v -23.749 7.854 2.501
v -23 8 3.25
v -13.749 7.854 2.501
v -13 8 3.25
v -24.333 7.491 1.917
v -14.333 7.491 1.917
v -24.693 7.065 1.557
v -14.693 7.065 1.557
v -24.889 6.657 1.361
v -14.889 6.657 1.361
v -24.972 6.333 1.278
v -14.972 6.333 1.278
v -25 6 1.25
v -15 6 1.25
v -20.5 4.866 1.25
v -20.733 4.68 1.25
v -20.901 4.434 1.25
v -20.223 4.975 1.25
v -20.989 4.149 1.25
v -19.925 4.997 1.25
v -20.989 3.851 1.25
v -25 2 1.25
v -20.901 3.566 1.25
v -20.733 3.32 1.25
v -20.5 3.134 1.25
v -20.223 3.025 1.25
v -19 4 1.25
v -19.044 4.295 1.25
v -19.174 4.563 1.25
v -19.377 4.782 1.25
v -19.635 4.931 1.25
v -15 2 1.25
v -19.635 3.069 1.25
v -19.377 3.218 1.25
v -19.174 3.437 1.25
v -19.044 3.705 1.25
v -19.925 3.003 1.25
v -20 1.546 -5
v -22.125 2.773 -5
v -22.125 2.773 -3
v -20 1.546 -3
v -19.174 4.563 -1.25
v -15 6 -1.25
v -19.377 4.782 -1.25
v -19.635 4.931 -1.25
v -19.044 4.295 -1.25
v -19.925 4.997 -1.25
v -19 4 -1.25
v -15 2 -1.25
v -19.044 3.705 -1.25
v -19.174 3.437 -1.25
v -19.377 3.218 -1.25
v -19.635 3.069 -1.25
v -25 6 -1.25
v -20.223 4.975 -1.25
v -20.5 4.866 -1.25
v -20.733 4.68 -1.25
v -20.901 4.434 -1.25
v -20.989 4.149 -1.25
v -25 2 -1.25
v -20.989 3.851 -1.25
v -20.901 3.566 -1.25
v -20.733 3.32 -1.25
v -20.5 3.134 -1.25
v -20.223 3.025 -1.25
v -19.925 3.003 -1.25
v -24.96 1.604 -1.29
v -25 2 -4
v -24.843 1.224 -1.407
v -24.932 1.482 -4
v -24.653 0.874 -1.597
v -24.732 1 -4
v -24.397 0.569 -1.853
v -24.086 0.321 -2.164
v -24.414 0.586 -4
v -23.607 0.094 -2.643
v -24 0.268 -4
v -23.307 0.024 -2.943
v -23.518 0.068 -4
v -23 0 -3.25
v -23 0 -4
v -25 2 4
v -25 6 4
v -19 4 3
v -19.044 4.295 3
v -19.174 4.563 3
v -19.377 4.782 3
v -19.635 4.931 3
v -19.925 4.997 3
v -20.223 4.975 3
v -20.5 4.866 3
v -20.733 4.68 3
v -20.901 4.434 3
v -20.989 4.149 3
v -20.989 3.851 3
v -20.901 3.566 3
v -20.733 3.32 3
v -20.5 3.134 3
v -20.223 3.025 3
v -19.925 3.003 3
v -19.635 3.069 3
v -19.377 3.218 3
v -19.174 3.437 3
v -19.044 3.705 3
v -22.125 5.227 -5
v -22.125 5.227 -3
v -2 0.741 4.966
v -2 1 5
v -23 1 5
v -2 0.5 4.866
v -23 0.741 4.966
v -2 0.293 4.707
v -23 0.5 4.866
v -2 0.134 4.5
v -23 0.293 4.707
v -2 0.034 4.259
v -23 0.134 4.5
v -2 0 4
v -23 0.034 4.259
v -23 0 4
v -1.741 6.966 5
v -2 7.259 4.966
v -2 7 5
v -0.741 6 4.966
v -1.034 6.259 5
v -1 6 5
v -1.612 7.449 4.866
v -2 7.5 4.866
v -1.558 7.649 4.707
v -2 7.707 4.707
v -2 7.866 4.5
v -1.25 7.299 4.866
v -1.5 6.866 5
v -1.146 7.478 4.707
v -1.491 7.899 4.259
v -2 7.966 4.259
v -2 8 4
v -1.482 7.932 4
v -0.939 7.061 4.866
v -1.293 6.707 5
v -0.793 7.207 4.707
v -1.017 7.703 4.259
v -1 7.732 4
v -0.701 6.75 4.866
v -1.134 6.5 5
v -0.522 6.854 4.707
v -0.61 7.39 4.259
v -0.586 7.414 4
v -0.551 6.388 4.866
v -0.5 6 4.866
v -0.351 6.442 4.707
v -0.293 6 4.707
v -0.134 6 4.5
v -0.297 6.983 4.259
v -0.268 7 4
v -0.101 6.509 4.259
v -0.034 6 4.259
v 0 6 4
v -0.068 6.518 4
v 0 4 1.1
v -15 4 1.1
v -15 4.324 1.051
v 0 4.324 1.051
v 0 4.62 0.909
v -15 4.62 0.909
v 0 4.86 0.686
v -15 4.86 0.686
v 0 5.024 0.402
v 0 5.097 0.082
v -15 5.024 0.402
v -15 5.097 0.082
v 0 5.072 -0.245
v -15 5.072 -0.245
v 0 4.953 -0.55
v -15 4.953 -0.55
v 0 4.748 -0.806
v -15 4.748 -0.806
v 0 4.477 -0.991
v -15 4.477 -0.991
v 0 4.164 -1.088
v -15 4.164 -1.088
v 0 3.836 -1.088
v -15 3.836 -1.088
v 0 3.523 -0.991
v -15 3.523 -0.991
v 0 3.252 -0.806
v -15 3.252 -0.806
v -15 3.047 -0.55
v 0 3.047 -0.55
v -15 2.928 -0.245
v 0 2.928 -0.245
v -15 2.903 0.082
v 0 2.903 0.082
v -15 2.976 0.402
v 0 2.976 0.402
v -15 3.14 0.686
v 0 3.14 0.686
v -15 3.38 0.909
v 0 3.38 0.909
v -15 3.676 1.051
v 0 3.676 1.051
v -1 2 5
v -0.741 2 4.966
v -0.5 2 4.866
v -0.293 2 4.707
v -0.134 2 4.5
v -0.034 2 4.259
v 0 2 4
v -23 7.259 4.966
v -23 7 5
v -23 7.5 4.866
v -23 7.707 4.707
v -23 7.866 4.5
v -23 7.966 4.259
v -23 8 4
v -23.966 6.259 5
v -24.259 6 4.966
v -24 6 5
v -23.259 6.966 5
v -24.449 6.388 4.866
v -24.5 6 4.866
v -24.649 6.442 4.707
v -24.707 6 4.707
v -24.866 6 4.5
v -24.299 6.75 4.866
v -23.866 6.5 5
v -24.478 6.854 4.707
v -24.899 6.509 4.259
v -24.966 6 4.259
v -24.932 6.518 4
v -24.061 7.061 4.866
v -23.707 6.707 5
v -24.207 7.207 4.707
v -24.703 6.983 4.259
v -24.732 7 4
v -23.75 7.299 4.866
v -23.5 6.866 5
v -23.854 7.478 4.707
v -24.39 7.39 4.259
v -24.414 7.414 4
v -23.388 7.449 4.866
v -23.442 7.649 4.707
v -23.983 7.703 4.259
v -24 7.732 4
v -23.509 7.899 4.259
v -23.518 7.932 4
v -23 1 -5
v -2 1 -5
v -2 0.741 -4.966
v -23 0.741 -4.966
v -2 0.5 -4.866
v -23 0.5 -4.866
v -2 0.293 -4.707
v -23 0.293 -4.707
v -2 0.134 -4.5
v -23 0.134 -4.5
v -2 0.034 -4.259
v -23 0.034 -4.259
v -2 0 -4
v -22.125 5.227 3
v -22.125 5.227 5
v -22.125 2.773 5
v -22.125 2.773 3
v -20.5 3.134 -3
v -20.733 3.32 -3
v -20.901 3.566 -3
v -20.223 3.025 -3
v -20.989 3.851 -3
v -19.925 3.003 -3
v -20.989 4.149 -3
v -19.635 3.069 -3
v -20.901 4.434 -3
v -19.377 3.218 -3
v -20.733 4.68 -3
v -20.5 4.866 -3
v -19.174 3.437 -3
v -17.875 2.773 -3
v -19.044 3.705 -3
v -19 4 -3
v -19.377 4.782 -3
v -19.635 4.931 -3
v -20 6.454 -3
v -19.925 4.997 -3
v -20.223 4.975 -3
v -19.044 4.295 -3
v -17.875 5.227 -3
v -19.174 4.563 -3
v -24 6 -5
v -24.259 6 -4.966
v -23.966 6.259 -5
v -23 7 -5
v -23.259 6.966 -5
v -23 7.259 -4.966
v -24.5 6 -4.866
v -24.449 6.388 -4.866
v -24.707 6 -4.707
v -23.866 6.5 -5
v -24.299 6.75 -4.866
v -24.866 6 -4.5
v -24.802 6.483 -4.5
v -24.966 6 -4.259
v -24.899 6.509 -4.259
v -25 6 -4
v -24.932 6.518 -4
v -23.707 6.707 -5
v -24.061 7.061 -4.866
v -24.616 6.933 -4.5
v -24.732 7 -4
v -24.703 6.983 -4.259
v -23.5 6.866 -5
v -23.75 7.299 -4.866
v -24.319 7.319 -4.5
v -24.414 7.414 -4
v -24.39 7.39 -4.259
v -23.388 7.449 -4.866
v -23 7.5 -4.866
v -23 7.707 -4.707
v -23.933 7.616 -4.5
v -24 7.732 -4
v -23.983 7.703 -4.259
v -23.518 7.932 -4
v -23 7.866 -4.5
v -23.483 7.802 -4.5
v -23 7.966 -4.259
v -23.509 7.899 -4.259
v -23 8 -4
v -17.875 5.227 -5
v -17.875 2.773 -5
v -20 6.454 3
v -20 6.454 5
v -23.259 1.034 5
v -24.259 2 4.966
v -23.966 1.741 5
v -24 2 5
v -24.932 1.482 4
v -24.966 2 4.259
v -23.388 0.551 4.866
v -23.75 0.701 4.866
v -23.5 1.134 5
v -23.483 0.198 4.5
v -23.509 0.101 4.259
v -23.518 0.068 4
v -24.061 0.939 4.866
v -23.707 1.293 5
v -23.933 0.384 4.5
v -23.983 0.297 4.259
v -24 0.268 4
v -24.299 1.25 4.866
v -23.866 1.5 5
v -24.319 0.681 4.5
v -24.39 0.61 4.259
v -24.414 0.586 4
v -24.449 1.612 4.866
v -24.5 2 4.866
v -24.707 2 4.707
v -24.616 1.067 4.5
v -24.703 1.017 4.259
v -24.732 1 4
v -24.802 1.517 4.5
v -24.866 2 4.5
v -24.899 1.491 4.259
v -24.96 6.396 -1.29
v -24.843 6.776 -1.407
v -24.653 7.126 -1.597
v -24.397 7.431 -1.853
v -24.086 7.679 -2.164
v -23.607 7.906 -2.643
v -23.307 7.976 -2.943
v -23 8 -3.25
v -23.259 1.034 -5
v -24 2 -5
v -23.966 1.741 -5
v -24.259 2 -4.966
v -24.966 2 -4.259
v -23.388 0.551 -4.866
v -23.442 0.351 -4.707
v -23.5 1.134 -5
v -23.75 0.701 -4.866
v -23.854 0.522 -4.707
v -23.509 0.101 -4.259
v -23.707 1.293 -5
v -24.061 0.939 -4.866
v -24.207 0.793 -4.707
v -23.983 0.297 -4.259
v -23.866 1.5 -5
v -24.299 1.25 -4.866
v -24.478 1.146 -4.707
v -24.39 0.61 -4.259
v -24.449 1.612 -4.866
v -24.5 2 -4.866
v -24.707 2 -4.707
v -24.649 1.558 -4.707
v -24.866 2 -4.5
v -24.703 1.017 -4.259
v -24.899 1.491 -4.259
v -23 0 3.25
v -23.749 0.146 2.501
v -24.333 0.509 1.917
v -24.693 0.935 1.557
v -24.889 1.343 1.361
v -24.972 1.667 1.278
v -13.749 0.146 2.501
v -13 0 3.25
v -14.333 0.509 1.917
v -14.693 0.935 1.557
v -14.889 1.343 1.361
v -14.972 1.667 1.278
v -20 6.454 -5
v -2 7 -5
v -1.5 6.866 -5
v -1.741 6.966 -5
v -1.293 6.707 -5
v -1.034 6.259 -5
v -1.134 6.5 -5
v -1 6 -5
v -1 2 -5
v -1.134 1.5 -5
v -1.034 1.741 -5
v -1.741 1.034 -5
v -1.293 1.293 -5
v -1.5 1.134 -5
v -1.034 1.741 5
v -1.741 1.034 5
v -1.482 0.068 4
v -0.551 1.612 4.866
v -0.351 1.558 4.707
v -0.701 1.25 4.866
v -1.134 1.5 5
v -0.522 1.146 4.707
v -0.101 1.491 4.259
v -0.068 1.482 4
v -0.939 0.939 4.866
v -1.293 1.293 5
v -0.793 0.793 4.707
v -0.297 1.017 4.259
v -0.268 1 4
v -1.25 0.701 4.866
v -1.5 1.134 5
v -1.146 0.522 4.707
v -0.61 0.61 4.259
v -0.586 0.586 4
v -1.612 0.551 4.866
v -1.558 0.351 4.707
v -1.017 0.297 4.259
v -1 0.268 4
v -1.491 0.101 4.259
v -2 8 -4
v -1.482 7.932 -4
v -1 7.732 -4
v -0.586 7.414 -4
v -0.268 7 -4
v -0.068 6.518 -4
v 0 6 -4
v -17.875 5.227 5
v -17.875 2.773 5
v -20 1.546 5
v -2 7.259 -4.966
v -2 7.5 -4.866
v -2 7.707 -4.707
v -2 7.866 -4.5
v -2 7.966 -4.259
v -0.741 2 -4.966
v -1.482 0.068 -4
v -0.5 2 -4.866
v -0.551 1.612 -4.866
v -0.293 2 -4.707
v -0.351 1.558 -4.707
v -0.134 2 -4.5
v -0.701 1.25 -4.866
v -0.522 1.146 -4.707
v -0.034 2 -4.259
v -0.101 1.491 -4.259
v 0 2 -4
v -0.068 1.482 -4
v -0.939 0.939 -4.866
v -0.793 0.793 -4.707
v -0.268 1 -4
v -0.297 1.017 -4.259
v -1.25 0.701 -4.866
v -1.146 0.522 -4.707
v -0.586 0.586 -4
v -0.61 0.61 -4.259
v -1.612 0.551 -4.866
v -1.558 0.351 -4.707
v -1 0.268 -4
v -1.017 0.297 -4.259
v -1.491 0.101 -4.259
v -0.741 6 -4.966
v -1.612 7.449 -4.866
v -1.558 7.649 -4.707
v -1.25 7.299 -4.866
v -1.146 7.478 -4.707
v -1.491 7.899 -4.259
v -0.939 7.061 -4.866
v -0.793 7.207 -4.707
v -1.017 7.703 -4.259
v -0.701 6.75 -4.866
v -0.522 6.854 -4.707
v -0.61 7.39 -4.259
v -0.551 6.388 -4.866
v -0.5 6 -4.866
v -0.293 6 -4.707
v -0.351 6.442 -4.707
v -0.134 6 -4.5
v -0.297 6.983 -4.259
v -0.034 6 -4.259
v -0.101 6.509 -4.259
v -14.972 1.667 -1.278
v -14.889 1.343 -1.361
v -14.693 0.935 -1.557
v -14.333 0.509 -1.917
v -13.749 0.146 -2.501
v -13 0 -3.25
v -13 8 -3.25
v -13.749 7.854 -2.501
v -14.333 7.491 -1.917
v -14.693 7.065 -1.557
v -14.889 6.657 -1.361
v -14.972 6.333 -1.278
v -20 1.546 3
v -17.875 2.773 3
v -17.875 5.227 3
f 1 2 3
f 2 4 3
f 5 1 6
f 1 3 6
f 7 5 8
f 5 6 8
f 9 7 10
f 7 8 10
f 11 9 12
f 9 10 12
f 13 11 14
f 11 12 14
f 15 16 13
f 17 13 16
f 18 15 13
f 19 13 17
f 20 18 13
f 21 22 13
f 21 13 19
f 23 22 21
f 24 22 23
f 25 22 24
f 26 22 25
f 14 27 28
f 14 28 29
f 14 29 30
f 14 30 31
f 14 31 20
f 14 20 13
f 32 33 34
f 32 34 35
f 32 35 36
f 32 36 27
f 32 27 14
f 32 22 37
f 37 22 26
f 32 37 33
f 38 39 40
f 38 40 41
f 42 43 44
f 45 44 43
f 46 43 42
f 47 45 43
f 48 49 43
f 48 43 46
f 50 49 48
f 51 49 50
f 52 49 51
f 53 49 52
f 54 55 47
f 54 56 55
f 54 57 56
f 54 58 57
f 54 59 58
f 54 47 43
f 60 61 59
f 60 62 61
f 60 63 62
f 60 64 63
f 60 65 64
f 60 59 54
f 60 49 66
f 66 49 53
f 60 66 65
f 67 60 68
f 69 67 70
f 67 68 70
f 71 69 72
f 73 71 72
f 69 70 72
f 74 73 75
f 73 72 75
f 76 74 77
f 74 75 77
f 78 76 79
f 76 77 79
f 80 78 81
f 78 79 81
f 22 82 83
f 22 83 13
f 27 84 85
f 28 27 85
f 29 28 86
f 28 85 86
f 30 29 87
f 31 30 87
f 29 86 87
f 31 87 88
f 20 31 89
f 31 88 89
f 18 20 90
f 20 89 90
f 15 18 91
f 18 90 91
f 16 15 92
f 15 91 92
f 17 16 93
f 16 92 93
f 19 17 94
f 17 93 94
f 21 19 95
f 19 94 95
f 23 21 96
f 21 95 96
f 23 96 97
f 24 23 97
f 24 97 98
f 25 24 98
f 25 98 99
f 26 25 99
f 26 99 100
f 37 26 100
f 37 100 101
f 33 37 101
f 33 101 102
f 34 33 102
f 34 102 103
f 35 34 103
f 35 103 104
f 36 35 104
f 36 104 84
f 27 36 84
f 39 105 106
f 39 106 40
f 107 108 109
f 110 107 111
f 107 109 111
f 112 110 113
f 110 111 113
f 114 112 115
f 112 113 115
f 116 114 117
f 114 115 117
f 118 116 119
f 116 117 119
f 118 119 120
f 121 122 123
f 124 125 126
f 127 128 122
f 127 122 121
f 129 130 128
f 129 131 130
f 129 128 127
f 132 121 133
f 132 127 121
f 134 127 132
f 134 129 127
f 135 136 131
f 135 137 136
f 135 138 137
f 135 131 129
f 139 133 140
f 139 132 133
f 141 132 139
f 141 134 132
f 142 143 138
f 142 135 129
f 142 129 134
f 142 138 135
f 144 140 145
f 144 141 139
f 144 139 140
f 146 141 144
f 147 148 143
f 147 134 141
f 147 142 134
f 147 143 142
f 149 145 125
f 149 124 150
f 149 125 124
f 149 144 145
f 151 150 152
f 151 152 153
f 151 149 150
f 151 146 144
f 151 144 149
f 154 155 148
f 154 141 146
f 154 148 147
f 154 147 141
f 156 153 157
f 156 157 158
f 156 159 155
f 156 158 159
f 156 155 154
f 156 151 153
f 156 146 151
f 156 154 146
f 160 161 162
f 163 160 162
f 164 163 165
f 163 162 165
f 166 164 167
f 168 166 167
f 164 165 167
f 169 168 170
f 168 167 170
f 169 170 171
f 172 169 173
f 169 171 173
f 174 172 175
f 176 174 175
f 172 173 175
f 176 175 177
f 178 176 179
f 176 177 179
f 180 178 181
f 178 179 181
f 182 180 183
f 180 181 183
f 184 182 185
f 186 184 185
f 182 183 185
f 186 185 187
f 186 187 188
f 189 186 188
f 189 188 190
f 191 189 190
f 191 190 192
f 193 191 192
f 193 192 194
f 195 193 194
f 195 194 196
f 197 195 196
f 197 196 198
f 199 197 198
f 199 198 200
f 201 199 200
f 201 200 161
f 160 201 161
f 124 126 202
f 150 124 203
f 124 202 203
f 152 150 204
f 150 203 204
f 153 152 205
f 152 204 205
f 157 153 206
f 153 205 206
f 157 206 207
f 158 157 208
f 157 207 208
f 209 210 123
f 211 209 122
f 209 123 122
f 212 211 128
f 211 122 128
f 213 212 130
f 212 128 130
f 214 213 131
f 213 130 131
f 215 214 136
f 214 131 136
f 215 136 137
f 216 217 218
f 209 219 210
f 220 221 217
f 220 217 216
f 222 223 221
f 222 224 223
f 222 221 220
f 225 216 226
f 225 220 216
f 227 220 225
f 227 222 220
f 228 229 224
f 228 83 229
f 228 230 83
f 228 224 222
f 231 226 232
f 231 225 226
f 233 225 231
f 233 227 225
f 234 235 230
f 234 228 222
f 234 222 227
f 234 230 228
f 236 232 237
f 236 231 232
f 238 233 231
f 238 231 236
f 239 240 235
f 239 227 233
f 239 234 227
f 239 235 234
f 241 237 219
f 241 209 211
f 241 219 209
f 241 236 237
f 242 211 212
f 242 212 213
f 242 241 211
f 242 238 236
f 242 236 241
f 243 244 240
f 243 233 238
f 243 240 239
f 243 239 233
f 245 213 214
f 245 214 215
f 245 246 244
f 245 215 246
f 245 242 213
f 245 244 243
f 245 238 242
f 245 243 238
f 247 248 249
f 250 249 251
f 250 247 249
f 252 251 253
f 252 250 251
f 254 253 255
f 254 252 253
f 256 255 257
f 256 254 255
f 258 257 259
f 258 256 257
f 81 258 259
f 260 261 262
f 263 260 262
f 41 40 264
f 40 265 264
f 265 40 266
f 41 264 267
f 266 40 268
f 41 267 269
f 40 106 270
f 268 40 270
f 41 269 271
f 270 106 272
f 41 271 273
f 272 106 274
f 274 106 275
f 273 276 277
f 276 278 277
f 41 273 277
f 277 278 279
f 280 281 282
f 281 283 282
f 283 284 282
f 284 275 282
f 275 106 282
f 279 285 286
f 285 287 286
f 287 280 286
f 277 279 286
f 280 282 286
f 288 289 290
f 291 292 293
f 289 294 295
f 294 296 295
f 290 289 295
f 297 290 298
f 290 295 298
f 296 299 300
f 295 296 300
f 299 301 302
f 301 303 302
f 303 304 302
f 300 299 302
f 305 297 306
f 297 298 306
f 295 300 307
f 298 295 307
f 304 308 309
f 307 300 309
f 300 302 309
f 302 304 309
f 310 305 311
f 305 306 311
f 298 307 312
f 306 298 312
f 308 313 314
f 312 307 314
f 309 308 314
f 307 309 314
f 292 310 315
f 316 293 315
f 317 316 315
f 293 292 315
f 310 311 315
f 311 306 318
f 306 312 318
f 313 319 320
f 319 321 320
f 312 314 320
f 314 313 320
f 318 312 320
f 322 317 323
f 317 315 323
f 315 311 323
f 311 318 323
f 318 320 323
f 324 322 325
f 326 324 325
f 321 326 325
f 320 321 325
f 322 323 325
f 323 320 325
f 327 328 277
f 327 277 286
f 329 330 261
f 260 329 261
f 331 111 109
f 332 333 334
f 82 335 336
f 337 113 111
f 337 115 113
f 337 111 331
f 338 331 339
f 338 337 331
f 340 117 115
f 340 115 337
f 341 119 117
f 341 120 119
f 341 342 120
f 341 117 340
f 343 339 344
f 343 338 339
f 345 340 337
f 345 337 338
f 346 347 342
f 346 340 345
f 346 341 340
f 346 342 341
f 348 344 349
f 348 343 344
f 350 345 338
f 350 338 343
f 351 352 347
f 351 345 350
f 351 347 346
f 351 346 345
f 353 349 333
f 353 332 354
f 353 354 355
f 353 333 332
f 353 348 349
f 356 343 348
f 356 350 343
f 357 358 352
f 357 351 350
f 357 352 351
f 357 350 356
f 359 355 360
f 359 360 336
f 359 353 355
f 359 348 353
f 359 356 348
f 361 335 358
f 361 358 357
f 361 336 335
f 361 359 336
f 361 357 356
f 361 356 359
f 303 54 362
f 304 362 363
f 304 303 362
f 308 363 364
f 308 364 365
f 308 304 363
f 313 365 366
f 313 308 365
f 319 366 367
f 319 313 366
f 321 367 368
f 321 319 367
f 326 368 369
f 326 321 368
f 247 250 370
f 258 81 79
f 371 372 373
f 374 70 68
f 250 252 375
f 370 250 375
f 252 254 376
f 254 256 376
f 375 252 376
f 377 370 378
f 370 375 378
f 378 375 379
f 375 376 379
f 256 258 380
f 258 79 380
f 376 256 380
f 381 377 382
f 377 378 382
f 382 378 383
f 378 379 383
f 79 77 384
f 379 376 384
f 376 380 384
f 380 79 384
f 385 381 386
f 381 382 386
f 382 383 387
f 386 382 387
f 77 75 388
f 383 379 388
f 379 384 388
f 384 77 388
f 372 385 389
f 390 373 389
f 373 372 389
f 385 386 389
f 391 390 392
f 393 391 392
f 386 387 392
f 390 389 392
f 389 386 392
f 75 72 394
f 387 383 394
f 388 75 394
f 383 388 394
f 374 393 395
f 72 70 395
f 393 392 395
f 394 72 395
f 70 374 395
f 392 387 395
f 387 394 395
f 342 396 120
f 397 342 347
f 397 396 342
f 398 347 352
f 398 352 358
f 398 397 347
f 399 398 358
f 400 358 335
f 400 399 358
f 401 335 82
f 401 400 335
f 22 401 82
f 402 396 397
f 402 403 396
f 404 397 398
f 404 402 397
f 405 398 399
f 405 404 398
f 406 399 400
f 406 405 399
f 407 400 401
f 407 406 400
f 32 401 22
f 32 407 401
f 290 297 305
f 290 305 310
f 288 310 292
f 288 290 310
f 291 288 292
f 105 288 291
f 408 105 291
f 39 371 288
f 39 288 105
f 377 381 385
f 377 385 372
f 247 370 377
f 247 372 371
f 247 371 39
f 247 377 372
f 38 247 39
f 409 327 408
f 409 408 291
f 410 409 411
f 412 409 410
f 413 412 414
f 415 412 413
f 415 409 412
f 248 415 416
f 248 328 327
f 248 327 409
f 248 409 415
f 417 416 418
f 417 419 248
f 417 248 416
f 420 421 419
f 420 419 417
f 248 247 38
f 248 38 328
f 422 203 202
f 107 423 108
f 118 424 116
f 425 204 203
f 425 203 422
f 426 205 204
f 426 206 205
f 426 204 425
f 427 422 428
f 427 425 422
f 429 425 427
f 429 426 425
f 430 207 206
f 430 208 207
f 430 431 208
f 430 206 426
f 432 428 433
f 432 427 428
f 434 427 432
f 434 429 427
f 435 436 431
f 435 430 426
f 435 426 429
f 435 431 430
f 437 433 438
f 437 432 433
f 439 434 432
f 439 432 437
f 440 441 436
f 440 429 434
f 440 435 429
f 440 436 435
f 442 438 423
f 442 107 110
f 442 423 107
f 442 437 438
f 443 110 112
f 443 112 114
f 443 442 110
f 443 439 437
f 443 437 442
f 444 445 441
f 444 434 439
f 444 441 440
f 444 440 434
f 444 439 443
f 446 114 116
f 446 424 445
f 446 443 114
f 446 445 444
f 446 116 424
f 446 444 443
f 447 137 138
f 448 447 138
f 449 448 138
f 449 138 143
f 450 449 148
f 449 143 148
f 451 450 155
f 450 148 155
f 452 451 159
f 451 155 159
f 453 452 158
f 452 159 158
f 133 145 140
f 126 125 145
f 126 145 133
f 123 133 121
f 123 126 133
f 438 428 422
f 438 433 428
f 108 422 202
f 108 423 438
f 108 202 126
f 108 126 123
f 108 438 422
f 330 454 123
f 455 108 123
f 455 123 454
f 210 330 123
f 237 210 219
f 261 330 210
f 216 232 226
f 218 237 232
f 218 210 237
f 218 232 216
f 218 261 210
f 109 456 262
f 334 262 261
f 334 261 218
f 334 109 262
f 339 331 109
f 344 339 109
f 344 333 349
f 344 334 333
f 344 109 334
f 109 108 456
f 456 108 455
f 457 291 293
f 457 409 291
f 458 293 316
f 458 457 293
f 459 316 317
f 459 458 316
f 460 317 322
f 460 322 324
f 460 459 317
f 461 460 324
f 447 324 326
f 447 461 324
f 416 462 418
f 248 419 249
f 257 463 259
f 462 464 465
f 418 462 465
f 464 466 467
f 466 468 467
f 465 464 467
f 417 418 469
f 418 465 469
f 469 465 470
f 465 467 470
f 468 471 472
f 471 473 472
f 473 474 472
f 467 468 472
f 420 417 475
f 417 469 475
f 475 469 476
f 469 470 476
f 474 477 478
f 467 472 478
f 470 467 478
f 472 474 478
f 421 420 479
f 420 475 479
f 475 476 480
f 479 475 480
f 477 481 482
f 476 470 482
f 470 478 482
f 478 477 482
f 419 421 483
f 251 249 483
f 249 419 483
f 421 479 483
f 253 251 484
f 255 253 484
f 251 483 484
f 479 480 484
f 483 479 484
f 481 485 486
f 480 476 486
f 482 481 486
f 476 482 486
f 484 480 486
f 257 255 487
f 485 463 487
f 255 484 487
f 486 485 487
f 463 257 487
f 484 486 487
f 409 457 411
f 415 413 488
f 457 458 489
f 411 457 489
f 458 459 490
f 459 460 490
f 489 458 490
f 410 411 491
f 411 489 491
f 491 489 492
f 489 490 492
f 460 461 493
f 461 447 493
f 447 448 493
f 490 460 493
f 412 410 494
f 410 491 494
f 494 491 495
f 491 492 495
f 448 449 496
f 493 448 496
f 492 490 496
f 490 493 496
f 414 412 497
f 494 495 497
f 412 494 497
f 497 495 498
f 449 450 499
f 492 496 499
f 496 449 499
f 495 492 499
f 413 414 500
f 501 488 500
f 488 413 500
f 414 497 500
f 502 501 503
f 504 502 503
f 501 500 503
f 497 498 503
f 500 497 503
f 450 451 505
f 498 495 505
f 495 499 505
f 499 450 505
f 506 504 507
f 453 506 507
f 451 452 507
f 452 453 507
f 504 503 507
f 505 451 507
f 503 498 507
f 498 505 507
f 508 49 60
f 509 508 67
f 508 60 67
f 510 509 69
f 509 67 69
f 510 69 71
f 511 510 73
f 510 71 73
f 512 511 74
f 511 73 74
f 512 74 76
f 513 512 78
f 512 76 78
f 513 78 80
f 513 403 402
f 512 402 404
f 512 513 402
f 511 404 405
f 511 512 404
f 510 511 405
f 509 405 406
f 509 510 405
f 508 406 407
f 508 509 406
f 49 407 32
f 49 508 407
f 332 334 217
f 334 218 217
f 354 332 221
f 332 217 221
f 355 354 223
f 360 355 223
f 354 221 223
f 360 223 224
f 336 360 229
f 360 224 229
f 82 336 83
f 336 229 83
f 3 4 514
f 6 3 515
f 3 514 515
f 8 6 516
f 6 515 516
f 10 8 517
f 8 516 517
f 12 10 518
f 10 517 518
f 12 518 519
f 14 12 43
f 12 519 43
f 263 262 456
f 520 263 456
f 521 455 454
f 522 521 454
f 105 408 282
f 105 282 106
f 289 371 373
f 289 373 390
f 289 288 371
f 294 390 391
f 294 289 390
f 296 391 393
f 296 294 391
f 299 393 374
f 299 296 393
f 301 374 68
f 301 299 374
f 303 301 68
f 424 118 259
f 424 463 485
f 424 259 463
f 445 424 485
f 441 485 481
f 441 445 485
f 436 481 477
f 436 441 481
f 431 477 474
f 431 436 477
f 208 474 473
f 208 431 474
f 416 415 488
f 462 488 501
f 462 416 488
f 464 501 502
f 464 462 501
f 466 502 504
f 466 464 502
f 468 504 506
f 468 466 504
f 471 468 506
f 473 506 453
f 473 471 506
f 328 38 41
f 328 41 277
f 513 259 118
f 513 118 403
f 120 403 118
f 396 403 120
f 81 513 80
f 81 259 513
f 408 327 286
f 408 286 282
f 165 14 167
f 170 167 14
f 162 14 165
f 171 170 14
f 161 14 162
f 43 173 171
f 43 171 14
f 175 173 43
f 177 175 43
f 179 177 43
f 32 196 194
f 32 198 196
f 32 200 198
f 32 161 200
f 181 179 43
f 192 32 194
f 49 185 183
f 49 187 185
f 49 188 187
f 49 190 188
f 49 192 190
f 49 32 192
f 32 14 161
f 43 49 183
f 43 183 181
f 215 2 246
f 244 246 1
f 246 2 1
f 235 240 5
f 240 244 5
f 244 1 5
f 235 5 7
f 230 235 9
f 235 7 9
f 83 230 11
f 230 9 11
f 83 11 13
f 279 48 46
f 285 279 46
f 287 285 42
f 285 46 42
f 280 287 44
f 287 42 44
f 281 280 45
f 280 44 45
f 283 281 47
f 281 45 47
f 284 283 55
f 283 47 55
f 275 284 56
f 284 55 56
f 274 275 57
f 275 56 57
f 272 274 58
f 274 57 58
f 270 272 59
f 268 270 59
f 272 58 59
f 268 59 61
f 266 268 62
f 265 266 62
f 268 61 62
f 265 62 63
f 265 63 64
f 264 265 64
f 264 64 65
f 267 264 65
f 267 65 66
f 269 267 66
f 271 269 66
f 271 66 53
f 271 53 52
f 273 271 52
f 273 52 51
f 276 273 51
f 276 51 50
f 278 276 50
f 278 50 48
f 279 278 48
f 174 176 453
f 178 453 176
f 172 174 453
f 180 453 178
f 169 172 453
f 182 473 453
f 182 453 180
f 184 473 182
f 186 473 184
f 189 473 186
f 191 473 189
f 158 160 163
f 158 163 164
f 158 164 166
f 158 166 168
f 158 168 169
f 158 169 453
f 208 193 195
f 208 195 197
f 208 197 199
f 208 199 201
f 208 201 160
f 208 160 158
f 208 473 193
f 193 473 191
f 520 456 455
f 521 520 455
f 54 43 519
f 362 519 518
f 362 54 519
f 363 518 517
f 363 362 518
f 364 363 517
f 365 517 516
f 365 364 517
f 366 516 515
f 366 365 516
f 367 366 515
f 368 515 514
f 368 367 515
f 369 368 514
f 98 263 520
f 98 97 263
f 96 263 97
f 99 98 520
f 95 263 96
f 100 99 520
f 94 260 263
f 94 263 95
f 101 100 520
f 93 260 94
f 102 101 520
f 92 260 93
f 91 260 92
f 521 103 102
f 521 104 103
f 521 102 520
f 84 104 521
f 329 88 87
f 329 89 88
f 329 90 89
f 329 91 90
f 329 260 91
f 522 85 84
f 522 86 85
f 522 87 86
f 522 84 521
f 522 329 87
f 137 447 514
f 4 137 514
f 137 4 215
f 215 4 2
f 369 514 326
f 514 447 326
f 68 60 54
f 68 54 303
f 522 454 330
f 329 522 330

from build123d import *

# Parameters (mm, degrees)
BOSS_EXTRUDE1_DEPTH = 8
SKETCH2_R           = 1.1
CUT_EXTRUDE1_DEPTH  = 18.720045147
SKETCH3_R           = 1
CUT_EXTRUDE2_DEPTH  = 29.08914381
CUT_EXTRUDE3_DEPTH  = 2
FILLET1_R           = 2
FILLET2_R           = 1


with BuildPart() as part:
    # Sketch1 → Boss-Extrude1 (new body)
    with BuildSketch(Plane(origin=(0, 0, 0), x_dir=(1, 0, 0), z_dir=(0, 1, 0))):
        Polygon((-25, 1.25), (-25, 5), (0, 5), (0, -5), (-25, -5), (-25, -1.25), (-15, -1.25), (-15, 1.25), align=None)
    extrude(amount=BOSS_EXTRUDE1_DEPTH)

    # Sketch2 → Cut-Extrude1 (cut, through all)
    with BuildSketch(Plane.ZY.offset(15)):
        with Locations((0, 4)):
            Circle(SKETCH2_R)
    extrude(amount=-CUT_EXTRUDE1_DEPTH, mode=Mode.SUBTRACT)

    # Sketch3 → Cut-Extrude2 (cut, through all)
    with BuildSketch(Plane.XY.offset(5)):
        with Locations((-20, 4)):
            Circle(SKETCH3_R)
    extrude(amount=-CUT_EXTRUDE2_DEPTH, mode=Mode.SUBTRACT)

    # Sketch4 → Cut-Extrude3 (cut)
    with BuildSketch(Plane.XY.offset(5)):
        Polygon((-20, 1.546261356), (-17.875, 2.773130678), (-17.875, 5.226869322), (-20, 6.453738644), (-22.125, 5.226869322), (-22.125, 2.773130678), align=None)
    cut_extrude3 = extrude(amount=-CUT_EXTRUDE3_DEPTH, mode=Mode.SUBTRACT)

    # Mirror1: Cut-Extrude3 across plane
    add(cut_extrude3.mirror(Plane.XY), mode=Mode.SUBTRACT)

    # Fillet1
    fillet1_edges = [part.edges().sort_by_distance(p)[0] for p in [
        (0, 0, 0),
        (-15, 8, 0),
        (-25, 0, 3.125),
        (-20, 0, 1.25),
        (-15, 0, 0),
        (-20, 0, -1.25),
        (-20, 8, 1.25),
        (-25, 8, 3.125),
        (0, 8, 0),
        (-25, 8, -3.125),
        (-20, 8, -1.25),
        (-25, 0, -3.125),
    ]]
    fillet(fillet1_edges, radius=FILLET1_R)

    # Fillet2
    fillet2_edges = [part.edges().sort_by_distance(p)[0] for p in [
        (-25, 4, 5),
        (-12.5, 8, 5),
        (-12.5, 8, -5),
        (-12.5, 0, 5),
        (0, 4, 5),
        (-0.585786438, 7.414213562, 5),
        (-24.414213562, 0.585786438, 5),
        (-0.585786438, 0.585786438, 5),
        (-24.414213562, 7.414213562, 5),
        (-25, 4, -5),
        (-12.5, 0, -5),
        (0, 4, -5),
        (-0.585786438, 7.414213562, -5),
        (-24.414213562, 0.585786438, -5),
        (-0.585786438, 0.585786438, -5),
        (-24.414213562, 7.414213562, -5),
    ]]
    fillet(fillet2_edges, radius=FILLET2_R)


solid = part.part
